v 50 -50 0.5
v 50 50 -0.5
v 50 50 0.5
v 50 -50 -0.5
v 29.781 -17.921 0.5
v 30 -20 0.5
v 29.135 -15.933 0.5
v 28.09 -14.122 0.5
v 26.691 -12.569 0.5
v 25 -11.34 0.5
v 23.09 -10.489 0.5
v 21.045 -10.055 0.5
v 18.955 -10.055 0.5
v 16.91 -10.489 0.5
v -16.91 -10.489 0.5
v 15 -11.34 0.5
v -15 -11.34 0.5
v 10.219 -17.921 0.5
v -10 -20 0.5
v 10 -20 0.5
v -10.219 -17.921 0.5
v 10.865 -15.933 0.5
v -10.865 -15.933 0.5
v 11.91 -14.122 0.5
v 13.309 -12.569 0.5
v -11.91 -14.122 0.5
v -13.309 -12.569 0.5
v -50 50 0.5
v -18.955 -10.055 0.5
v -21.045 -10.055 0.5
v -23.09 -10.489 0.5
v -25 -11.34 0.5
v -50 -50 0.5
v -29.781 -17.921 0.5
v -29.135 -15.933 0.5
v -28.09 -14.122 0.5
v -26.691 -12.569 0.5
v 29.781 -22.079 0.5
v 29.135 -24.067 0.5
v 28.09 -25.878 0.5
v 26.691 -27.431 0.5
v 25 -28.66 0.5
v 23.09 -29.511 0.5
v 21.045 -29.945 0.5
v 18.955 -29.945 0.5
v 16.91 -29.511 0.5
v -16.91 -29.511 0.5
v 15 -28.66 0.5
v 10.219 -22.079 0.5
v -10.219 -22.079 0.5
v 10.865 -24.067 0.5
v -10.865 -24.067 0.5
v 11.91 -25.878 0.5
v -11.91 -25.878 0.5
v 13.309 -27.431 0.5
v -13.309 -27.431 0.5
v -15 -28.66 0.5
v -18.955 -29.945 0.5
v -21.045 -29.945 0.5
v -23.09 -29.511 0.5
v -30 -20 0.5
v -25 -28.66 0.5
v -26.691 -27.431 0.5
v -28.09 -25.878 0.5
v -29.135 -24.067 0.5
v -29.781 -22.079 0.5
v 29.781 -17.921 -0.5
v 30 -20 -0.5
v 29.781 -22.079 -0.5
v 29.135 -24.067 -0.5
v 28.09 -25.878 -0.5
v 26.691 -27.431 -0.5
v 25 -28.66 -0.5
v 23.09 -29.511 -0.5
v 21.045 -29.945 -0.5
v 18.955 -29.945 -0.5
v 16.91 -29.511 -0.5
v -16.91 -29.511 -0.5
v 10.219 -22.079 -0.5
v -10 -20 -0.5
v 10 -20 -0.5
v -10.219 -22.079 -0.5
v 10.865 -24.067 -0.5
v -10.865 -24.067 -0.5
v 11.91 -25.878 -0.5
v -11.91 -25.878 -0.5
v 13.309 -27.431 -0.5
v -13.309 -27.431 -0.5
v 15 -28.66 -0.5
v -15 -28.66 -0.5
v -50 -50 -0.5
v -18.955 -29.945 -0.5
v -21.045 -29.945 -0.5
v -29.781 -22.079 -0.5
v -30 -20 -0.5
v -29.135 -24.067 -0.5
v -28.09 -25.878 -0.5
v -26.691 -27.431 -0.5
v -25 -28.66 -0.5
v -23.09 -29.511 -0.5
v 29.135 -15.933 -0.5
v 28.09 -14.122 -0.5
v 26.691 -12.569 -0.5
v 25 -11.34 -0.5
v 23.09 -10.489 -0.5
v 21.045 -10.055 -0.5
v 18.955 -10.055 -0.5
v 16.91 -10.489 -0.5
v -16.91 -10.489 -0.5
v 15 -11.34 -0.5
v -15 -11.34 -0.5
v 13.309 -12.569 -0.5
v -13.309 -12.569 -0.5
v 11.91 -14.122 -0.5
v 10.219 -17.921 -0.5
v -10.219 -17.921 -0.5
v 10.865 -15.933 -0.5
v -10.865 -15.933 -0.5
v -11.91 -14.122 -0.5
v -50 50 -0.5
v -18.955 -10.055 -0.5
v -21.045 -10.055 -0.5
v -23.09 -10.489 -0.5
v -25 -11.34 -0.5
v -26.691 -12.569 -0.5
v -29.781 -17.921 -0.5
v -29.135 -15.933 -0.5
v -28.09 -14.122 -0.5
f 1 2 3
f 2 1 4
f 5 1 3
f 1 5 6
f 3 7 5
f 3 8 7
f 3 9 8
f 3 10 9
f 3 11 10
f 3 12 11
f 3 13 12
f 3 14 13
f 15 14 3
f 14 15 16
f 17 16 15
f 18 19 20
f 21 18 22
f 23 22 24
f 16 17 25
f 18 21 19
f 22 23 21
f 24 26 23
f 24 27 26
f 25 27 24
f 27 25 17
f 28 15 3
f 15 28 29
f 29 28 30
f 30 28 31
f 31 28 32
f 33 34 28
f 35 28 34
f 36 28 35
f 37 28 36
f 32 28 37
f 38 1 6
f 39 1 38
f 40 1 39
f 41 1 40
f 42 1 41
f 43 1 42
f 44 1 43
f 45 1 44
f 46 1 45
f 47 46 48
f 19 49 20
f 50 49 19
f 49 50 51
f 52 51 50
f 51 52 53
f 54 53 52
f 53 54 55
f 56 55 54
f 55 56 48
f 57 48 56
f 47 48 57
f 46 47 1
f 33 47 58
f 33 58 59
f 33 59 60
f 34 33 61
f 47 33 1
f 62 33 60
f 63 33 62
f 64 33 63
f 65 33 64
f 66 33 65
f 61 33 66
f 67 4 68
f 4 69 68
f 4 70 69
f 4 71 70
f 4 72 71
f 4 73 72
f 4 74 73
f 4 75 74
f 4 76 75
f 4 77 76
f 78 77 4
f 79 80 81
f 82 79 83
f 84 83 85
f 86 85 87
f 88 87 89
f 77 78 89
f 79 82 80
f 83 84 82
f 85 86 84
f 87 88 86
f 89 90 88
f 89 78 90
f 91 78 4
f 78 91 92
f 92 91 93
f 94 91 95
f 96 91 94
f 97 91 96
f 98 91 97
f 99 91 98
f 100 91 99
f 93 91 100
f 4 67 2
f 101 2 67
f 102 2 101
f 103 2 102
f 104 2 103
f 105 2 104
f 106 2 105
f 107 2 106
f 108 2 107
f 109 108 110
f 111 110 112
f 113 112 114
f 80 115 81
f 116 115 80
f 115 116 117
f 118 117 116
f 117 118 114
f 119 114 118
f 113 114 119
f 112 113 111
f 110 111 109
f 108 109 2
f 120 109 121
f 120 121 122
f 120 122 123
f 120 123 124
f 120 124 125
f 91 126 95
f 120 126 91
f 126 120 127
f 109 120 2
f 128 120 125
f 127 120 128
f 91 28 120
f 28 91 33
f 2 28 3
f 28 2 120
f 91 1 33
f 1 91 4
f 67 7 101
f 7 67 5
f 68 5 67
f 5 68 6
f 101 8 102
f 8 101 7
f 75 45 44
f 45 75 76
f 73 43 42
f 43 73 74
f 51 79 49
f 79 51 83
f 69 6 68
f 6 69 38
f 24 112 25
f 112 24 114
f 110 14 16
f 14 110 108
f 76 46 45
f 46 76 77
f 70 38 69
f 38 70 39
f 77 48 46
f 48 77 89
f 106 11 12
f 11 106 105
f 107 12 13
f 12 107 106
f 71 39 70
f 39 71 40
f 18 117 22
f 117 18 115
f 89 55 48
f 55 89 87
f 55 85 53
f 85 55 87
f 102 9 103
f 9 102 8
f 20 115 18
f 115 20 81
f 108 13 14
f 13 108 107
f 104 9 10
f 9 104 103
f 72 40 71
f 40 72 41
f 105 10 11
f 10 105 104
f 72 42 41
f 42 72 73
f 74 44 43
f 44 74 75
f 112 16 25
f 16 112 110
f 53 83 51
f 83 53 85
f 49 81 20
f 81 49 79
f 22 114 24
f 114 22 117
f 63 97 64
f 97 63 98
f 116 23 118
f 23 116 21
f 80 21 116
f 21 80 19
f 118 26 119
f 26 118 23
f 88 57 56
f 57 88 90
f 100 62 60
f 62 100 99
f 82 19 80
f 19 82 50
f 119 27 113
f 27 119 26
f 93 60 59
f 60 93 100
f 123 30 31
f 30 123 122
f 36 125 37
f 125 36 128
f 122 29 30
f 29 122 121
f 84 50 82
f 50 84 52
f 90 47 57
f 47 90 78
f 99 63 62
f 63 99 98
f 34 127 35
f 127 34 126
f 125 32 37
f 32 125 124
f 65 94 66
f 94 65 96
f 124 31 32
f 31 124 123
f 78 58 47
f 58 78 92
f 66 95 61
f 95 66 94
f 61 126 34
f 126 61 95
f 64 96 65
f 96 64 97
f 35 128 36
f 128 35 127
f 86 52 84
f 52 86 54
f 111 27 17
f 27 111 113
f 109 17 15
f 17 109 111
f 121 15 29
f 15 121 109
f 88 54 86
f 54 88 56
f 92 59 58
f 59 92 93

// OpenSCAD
interasse = 40;
first_hole = [20,-20,-2];

difference(){

cube([100,100,1], center = true);

translate(first_hole){
cylinder(10,10,10);
}

translate([first_hole[0] - interasse,-20,-2]){
cylinder(10,10,10);
}
}
